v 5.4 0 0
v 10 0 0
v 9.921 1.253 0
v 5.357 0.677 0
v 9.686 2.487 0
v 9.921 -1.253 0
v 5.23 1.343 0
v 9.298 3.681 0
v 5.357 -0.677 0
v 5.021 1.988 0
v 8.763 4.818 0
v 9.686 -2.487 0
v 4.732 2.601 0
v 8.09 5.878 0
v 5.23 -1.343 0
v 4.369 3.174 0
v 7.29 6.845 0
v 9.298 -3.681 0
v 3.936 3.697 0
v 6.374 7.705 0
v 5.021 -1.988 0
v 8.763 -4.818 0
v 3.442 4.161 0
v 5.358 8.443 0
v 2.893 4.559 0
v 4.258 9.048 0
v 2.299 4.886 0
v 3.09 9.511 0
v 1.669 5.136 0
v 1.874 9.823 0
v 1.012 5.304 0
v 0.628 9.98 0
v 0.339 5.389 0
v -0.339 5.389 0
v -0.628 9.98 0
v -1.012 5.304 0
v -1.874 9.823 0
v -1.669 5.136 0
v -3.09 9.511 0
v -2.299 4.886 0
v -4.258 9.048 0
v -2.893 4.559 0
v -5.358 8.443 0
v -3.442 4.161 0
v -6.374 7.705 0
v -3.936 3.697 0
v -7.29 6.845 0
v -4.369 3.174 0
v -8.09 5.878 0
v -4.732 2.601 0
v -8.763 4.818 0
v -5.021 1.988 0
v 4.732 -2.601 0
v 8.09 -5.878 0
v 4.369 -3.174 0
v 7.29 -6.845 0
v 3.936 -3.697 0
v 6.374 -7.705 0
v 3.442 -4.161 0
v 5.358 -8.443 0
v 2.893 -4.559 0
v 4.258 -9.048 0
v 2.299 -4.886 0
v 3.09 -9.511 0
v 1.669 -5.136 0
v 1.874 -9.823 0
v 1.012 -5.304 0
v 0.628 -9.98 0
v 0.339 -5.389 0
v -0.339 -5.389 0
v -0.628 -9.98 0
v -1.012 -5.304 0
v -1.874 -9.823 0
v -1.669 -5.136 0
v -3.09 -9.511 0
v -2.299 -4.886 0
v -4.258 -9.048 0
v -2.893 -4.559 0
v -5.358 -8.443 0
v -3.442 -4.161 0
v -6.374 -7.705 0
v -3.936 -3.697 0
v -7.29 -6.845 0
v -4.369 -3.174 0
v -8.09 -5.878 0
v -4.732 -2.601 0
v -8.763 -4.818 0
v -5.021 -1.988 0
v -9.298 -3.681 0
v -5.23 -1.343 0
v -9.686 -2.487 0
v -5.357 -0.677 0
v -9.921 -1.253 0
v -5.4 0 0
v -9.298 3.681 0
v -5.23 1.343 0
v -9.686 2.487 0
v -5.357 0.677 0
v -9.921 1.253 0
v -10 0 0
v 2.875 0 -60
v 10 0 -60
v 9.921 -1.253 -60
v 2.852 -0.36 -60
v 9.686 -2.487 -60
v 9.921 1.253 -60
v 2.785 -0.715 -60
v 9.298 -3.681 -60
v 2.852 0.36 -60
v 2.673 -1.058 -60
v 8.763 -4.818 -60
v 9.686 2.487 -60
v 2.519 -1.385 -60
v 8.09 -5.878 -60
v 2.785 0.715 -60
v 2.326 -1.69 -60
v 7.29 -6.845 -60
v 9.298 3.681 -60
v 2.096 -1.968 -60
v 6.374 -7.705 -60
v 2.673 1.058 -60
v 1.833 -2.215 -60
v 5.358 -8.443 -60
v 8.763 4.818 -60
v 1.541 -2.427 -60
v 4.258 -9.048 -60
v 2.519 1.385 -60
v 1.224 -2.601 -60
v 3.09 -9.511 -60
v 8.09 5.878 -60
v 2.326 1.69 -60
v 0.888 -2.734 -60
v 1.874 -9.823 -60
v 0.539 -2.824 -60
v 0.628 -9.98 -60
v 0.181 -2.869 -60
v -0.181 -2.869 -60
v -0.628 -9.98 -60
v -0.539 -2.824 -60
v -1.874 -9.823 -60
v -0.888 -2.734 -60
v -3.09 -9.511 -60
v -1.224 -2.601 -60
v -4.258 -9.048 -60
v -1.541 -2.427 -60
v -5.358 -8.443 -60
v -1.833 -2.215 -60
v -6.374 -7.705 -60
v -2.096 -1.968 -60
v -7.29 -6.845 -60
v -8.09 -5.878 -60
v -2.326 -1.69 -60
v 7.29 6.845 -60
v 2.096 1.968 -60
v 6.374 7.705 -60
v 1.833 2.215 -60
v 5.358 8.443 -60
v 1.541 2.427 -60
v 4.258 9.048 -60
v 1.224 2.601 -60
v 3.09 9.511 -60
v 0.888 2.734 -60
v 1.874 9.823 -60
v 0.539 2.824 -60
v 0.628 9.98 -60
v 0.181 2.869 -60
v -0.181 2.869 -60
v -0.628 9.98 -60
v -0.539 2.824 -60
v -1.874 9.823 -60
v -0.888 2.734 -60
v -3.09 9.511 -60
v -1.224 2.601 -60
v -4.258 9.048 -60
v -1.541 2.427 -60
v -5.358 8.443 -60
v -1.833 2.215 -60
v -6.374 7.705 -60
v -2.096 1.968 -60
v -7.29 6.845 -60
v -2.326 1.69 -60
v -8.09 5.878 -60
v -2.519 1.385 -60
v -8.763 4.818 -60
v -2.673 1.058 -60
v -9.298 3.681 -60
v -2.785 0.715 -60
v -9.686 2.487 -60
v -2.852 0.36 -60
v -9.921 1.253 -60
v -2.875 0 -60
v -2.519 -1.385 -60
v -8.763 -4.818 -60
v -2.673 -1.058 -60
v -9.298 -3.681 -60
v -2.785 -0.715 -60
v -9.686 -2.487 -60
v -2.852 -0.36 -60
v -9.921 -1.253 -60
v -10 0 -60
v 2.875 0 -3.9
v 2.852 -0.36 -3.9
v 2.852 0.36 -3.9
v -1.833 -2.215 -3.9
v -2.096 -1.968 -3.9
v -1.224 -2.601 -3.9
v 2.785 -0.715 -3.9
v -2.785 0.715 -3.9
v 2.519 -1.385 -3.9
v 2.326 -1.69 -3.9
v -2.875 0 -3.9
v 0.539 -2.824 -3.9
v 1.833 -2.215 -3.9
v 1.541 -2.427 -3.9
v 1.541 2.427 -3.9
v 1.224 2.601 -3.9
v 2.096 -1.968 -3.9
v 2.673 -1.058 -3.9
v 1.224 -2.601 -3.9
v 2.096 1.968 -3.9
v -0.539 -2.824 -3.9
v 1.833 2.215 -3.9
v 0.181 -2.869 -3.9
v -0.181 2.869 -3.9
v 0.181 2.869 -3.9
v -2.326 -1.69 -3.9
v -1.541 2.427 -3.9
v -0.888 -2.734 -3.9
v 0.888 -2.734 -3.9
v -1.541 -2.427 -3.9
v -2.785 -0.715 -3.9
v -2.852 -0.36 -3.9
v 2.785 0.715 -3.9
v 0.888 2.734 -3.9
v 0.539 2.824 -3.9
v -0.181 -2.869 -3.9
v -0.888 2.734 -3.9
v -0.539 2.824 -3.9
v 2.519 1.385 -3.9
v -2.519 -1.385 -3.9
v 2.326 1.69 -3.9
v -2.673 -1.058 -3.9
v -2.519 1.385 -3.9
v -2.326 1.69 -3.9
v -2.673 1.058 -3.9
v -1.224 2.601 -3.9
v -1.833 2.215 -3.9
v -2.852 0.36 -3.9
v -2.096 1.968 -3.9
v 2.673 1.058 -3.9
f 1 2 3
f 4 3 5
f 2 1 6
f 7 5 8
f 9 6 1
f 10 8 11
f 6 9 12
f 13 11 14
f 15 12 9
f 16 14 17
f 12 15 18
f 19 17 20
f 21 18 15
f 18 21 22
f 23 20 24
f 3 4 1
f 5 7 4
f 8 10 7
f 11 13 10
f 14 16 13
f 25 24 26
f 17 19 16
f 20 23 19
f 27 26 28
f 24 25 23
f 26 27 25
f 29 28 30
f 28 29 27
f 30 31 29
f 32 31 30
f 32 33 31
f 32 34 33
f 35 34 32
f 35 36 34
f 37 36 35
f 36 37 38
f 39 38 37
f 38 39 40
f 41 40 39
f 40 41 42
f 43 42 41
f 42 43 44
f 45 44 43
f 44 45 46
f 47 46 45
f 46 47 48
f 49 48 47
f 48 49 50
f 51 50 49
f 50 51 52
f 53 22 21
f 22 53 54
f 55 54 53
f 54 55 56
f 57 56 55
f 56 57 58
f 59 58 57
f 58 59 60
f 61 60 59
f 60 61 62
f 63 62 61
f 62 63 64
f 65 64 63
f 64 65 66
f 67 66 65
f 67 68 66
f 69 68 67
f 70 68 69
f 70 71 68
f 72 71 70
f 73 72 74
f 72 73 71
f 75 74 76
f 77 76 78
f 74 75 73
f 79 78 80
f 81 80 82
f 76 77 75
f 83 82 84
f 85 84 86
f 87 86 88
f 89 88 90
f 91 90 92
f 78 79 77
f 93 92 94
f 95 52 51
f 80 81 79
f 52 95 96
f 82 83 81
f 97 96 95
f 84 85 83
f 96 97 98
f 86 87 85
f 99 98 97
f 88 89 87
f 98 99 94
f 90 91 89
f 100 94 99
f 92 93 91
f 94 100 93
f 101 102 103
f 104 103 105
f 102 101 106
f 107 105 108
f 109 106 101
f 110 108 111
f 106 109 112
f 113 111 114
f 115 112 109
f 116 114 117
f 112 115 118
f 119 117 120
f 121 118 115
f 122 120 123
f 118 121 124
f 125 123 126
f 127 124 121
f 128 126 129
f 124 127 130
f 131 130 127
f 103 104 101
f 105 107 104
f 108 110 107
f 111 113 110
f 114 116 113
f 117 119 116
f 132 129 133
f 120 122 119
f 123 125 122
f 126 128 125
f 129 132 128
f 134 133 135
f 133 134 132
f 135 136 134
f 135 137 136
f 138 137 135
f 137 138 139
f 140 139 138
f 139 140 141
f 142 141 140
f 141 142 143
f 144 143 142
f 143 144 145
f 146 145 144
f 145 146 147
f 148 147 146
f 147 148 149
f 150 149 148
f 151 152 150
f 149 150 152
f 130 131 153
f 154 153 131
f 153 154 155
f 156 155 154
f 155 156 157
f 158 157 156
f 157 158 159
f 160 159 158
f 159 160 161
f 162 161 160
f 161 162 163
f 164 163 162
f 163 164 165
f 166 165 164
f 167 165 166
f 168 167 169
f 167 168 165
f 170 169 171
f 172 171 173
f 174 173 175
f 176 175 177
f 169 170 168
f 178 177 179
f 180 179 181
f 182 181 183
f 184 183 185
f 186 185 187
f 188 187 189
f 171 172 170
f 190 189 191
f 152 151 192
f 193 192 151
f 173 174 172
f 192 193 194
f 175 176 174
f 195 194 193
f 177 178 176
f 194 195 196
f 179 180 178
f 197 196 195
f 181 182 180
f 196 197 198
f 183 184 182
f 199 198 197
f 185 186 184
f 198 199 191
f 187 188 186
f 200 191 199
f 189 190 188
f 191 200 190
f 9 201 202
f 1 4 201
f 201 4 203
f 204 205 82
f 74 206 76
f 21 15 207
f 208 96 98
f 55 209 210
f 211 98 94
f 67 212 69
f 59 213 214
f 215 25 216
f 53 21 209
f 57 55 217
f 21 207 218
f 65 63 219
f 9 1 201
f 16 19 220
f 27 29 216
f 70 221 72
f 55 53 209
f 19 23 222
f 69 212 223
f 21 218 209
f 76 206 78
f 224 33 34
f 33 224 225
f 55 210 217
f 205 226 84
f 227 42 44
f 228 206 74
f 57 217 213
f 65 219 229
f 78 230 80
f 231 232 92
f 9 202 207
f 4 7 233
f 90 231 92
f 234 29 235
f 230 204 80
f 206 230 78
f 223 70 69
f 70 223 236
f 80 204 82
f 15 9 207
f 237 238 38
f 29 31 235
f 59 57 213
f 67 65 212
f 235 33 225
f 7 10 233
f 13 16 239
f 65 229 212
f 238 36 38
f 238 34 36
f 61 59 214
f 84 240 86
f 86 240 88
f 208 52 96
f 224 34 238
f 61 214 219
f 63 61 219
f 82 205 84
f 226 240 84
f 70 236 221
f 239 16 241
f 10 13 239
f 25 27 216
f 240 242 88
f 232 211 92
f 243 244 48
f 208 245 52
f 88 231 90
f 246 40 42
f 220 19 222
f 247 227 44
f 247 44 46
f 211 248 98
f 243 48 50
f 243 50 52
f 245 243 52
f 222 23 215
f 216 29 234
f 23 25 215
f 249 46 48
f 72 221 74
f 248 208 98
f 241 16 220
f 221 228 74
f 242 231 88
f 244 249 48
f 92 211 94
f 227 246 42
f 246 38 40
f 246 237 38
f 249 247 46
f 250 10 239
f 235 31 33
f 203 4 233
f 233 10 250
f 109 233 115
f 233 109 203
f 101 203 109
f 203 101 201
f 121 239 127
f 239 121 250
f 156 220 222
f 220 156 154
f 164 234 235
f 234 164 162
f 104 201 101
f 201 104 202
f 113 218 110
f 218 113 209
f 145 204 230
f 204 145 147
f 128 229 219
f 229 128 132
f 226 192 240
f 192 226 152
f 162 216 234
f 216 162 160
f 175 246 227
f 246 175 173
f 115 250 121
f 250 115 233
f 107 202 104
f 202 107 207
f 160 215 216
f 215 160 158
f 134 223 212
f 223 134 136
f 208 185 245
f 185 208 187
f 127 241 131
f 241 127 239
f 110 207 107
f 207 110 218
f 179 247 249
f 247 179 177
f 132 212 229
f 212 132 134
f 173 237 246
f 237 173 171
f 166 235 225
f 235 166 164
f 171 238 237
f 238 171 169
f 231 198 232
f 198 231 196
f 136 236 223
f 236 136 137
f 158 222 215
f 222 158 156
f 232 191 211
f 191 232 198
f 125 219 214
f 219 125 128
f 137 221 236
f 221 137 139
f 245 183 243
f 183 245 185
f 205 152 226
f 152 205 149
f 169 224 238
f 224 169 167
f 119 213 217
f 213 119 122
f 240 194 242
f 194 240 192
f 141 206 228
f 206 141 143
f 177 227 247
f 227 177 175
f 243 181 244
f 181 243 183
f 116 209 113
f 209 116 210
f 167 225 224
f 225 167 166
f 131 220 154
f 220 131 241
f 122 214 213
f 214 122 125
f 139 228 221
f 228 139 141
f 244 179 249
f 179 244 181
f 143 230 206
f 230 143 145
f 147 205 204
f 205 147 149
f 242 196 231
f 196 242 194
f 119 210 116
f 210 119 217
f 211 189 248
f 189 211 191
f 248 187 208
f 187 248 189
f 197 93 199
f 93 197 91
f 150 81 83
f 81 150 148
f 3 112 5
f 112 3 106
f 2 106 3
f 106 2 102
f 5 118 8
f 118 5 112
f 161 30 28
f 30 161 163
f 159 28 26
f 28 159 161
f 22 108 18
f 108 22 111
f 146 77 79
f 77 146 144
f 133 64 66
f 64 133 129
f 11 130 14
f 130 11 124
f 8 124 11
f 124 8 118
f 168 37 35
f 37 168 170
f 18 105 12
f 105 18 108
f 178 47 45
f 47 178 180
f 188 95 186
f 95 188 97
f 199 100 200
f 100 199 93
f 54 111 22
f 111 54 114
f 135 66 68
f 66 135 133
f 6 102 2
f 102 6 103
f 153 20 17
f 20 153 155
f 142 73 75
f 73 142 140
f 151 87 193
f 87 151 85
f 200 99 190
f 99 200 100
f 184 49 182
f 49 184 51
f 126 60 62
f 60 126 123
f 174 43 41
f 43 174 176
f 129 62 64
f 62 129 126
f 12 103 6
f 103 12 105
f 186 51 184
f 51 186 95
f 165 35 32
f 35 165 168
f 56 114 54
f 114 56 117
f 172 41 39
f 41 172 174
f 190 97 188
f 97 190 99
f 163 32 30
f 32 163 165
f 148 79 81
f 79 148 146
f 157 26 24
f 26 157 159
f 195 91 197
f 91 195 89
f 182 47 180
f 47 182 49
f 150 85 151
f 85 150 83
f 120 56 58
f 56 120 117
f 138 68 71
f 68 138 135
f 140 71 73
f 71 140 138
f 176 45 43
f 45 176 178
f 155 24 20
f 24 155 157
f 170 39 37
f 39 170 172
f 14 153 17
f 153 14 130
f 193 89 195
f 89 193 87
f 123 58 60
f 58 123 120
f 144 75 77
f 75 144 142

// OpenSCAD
$fn = 50;


difference() {
	union() {
		translate(v = [0, 0, -60.0000000000]) {
			cylinder(h = 60, r = 10.0000000000);
		}
	}
	union() {
		translate(v = [0, 0, 0]) {
			rotate(a = [0, 0, 0]) {
				difference() {
					union() {
						#translate(v = [0, 0, -60.0000000000]) {
							cylinder(h = 60, r = 2.6000000000);
						}
						#translate(v = [0, 0, -3.9000000000]) {
							cylinder(h = 3.9000000000, r = 10.0000000000, r1 = 2.8750000000, r2 = 5.4000000000);
						}
						#translate(v = [0, 0, -60.0000000000]) {
							cylinder(h = 60, r = 2.8750000000);
						}
						#translate(v = [0, 0, -60.0000000000]) {
							cylinder(h = 60, r = 2.6000000000);
						}
					}
					union();
				}
			}
		}
	}
}
